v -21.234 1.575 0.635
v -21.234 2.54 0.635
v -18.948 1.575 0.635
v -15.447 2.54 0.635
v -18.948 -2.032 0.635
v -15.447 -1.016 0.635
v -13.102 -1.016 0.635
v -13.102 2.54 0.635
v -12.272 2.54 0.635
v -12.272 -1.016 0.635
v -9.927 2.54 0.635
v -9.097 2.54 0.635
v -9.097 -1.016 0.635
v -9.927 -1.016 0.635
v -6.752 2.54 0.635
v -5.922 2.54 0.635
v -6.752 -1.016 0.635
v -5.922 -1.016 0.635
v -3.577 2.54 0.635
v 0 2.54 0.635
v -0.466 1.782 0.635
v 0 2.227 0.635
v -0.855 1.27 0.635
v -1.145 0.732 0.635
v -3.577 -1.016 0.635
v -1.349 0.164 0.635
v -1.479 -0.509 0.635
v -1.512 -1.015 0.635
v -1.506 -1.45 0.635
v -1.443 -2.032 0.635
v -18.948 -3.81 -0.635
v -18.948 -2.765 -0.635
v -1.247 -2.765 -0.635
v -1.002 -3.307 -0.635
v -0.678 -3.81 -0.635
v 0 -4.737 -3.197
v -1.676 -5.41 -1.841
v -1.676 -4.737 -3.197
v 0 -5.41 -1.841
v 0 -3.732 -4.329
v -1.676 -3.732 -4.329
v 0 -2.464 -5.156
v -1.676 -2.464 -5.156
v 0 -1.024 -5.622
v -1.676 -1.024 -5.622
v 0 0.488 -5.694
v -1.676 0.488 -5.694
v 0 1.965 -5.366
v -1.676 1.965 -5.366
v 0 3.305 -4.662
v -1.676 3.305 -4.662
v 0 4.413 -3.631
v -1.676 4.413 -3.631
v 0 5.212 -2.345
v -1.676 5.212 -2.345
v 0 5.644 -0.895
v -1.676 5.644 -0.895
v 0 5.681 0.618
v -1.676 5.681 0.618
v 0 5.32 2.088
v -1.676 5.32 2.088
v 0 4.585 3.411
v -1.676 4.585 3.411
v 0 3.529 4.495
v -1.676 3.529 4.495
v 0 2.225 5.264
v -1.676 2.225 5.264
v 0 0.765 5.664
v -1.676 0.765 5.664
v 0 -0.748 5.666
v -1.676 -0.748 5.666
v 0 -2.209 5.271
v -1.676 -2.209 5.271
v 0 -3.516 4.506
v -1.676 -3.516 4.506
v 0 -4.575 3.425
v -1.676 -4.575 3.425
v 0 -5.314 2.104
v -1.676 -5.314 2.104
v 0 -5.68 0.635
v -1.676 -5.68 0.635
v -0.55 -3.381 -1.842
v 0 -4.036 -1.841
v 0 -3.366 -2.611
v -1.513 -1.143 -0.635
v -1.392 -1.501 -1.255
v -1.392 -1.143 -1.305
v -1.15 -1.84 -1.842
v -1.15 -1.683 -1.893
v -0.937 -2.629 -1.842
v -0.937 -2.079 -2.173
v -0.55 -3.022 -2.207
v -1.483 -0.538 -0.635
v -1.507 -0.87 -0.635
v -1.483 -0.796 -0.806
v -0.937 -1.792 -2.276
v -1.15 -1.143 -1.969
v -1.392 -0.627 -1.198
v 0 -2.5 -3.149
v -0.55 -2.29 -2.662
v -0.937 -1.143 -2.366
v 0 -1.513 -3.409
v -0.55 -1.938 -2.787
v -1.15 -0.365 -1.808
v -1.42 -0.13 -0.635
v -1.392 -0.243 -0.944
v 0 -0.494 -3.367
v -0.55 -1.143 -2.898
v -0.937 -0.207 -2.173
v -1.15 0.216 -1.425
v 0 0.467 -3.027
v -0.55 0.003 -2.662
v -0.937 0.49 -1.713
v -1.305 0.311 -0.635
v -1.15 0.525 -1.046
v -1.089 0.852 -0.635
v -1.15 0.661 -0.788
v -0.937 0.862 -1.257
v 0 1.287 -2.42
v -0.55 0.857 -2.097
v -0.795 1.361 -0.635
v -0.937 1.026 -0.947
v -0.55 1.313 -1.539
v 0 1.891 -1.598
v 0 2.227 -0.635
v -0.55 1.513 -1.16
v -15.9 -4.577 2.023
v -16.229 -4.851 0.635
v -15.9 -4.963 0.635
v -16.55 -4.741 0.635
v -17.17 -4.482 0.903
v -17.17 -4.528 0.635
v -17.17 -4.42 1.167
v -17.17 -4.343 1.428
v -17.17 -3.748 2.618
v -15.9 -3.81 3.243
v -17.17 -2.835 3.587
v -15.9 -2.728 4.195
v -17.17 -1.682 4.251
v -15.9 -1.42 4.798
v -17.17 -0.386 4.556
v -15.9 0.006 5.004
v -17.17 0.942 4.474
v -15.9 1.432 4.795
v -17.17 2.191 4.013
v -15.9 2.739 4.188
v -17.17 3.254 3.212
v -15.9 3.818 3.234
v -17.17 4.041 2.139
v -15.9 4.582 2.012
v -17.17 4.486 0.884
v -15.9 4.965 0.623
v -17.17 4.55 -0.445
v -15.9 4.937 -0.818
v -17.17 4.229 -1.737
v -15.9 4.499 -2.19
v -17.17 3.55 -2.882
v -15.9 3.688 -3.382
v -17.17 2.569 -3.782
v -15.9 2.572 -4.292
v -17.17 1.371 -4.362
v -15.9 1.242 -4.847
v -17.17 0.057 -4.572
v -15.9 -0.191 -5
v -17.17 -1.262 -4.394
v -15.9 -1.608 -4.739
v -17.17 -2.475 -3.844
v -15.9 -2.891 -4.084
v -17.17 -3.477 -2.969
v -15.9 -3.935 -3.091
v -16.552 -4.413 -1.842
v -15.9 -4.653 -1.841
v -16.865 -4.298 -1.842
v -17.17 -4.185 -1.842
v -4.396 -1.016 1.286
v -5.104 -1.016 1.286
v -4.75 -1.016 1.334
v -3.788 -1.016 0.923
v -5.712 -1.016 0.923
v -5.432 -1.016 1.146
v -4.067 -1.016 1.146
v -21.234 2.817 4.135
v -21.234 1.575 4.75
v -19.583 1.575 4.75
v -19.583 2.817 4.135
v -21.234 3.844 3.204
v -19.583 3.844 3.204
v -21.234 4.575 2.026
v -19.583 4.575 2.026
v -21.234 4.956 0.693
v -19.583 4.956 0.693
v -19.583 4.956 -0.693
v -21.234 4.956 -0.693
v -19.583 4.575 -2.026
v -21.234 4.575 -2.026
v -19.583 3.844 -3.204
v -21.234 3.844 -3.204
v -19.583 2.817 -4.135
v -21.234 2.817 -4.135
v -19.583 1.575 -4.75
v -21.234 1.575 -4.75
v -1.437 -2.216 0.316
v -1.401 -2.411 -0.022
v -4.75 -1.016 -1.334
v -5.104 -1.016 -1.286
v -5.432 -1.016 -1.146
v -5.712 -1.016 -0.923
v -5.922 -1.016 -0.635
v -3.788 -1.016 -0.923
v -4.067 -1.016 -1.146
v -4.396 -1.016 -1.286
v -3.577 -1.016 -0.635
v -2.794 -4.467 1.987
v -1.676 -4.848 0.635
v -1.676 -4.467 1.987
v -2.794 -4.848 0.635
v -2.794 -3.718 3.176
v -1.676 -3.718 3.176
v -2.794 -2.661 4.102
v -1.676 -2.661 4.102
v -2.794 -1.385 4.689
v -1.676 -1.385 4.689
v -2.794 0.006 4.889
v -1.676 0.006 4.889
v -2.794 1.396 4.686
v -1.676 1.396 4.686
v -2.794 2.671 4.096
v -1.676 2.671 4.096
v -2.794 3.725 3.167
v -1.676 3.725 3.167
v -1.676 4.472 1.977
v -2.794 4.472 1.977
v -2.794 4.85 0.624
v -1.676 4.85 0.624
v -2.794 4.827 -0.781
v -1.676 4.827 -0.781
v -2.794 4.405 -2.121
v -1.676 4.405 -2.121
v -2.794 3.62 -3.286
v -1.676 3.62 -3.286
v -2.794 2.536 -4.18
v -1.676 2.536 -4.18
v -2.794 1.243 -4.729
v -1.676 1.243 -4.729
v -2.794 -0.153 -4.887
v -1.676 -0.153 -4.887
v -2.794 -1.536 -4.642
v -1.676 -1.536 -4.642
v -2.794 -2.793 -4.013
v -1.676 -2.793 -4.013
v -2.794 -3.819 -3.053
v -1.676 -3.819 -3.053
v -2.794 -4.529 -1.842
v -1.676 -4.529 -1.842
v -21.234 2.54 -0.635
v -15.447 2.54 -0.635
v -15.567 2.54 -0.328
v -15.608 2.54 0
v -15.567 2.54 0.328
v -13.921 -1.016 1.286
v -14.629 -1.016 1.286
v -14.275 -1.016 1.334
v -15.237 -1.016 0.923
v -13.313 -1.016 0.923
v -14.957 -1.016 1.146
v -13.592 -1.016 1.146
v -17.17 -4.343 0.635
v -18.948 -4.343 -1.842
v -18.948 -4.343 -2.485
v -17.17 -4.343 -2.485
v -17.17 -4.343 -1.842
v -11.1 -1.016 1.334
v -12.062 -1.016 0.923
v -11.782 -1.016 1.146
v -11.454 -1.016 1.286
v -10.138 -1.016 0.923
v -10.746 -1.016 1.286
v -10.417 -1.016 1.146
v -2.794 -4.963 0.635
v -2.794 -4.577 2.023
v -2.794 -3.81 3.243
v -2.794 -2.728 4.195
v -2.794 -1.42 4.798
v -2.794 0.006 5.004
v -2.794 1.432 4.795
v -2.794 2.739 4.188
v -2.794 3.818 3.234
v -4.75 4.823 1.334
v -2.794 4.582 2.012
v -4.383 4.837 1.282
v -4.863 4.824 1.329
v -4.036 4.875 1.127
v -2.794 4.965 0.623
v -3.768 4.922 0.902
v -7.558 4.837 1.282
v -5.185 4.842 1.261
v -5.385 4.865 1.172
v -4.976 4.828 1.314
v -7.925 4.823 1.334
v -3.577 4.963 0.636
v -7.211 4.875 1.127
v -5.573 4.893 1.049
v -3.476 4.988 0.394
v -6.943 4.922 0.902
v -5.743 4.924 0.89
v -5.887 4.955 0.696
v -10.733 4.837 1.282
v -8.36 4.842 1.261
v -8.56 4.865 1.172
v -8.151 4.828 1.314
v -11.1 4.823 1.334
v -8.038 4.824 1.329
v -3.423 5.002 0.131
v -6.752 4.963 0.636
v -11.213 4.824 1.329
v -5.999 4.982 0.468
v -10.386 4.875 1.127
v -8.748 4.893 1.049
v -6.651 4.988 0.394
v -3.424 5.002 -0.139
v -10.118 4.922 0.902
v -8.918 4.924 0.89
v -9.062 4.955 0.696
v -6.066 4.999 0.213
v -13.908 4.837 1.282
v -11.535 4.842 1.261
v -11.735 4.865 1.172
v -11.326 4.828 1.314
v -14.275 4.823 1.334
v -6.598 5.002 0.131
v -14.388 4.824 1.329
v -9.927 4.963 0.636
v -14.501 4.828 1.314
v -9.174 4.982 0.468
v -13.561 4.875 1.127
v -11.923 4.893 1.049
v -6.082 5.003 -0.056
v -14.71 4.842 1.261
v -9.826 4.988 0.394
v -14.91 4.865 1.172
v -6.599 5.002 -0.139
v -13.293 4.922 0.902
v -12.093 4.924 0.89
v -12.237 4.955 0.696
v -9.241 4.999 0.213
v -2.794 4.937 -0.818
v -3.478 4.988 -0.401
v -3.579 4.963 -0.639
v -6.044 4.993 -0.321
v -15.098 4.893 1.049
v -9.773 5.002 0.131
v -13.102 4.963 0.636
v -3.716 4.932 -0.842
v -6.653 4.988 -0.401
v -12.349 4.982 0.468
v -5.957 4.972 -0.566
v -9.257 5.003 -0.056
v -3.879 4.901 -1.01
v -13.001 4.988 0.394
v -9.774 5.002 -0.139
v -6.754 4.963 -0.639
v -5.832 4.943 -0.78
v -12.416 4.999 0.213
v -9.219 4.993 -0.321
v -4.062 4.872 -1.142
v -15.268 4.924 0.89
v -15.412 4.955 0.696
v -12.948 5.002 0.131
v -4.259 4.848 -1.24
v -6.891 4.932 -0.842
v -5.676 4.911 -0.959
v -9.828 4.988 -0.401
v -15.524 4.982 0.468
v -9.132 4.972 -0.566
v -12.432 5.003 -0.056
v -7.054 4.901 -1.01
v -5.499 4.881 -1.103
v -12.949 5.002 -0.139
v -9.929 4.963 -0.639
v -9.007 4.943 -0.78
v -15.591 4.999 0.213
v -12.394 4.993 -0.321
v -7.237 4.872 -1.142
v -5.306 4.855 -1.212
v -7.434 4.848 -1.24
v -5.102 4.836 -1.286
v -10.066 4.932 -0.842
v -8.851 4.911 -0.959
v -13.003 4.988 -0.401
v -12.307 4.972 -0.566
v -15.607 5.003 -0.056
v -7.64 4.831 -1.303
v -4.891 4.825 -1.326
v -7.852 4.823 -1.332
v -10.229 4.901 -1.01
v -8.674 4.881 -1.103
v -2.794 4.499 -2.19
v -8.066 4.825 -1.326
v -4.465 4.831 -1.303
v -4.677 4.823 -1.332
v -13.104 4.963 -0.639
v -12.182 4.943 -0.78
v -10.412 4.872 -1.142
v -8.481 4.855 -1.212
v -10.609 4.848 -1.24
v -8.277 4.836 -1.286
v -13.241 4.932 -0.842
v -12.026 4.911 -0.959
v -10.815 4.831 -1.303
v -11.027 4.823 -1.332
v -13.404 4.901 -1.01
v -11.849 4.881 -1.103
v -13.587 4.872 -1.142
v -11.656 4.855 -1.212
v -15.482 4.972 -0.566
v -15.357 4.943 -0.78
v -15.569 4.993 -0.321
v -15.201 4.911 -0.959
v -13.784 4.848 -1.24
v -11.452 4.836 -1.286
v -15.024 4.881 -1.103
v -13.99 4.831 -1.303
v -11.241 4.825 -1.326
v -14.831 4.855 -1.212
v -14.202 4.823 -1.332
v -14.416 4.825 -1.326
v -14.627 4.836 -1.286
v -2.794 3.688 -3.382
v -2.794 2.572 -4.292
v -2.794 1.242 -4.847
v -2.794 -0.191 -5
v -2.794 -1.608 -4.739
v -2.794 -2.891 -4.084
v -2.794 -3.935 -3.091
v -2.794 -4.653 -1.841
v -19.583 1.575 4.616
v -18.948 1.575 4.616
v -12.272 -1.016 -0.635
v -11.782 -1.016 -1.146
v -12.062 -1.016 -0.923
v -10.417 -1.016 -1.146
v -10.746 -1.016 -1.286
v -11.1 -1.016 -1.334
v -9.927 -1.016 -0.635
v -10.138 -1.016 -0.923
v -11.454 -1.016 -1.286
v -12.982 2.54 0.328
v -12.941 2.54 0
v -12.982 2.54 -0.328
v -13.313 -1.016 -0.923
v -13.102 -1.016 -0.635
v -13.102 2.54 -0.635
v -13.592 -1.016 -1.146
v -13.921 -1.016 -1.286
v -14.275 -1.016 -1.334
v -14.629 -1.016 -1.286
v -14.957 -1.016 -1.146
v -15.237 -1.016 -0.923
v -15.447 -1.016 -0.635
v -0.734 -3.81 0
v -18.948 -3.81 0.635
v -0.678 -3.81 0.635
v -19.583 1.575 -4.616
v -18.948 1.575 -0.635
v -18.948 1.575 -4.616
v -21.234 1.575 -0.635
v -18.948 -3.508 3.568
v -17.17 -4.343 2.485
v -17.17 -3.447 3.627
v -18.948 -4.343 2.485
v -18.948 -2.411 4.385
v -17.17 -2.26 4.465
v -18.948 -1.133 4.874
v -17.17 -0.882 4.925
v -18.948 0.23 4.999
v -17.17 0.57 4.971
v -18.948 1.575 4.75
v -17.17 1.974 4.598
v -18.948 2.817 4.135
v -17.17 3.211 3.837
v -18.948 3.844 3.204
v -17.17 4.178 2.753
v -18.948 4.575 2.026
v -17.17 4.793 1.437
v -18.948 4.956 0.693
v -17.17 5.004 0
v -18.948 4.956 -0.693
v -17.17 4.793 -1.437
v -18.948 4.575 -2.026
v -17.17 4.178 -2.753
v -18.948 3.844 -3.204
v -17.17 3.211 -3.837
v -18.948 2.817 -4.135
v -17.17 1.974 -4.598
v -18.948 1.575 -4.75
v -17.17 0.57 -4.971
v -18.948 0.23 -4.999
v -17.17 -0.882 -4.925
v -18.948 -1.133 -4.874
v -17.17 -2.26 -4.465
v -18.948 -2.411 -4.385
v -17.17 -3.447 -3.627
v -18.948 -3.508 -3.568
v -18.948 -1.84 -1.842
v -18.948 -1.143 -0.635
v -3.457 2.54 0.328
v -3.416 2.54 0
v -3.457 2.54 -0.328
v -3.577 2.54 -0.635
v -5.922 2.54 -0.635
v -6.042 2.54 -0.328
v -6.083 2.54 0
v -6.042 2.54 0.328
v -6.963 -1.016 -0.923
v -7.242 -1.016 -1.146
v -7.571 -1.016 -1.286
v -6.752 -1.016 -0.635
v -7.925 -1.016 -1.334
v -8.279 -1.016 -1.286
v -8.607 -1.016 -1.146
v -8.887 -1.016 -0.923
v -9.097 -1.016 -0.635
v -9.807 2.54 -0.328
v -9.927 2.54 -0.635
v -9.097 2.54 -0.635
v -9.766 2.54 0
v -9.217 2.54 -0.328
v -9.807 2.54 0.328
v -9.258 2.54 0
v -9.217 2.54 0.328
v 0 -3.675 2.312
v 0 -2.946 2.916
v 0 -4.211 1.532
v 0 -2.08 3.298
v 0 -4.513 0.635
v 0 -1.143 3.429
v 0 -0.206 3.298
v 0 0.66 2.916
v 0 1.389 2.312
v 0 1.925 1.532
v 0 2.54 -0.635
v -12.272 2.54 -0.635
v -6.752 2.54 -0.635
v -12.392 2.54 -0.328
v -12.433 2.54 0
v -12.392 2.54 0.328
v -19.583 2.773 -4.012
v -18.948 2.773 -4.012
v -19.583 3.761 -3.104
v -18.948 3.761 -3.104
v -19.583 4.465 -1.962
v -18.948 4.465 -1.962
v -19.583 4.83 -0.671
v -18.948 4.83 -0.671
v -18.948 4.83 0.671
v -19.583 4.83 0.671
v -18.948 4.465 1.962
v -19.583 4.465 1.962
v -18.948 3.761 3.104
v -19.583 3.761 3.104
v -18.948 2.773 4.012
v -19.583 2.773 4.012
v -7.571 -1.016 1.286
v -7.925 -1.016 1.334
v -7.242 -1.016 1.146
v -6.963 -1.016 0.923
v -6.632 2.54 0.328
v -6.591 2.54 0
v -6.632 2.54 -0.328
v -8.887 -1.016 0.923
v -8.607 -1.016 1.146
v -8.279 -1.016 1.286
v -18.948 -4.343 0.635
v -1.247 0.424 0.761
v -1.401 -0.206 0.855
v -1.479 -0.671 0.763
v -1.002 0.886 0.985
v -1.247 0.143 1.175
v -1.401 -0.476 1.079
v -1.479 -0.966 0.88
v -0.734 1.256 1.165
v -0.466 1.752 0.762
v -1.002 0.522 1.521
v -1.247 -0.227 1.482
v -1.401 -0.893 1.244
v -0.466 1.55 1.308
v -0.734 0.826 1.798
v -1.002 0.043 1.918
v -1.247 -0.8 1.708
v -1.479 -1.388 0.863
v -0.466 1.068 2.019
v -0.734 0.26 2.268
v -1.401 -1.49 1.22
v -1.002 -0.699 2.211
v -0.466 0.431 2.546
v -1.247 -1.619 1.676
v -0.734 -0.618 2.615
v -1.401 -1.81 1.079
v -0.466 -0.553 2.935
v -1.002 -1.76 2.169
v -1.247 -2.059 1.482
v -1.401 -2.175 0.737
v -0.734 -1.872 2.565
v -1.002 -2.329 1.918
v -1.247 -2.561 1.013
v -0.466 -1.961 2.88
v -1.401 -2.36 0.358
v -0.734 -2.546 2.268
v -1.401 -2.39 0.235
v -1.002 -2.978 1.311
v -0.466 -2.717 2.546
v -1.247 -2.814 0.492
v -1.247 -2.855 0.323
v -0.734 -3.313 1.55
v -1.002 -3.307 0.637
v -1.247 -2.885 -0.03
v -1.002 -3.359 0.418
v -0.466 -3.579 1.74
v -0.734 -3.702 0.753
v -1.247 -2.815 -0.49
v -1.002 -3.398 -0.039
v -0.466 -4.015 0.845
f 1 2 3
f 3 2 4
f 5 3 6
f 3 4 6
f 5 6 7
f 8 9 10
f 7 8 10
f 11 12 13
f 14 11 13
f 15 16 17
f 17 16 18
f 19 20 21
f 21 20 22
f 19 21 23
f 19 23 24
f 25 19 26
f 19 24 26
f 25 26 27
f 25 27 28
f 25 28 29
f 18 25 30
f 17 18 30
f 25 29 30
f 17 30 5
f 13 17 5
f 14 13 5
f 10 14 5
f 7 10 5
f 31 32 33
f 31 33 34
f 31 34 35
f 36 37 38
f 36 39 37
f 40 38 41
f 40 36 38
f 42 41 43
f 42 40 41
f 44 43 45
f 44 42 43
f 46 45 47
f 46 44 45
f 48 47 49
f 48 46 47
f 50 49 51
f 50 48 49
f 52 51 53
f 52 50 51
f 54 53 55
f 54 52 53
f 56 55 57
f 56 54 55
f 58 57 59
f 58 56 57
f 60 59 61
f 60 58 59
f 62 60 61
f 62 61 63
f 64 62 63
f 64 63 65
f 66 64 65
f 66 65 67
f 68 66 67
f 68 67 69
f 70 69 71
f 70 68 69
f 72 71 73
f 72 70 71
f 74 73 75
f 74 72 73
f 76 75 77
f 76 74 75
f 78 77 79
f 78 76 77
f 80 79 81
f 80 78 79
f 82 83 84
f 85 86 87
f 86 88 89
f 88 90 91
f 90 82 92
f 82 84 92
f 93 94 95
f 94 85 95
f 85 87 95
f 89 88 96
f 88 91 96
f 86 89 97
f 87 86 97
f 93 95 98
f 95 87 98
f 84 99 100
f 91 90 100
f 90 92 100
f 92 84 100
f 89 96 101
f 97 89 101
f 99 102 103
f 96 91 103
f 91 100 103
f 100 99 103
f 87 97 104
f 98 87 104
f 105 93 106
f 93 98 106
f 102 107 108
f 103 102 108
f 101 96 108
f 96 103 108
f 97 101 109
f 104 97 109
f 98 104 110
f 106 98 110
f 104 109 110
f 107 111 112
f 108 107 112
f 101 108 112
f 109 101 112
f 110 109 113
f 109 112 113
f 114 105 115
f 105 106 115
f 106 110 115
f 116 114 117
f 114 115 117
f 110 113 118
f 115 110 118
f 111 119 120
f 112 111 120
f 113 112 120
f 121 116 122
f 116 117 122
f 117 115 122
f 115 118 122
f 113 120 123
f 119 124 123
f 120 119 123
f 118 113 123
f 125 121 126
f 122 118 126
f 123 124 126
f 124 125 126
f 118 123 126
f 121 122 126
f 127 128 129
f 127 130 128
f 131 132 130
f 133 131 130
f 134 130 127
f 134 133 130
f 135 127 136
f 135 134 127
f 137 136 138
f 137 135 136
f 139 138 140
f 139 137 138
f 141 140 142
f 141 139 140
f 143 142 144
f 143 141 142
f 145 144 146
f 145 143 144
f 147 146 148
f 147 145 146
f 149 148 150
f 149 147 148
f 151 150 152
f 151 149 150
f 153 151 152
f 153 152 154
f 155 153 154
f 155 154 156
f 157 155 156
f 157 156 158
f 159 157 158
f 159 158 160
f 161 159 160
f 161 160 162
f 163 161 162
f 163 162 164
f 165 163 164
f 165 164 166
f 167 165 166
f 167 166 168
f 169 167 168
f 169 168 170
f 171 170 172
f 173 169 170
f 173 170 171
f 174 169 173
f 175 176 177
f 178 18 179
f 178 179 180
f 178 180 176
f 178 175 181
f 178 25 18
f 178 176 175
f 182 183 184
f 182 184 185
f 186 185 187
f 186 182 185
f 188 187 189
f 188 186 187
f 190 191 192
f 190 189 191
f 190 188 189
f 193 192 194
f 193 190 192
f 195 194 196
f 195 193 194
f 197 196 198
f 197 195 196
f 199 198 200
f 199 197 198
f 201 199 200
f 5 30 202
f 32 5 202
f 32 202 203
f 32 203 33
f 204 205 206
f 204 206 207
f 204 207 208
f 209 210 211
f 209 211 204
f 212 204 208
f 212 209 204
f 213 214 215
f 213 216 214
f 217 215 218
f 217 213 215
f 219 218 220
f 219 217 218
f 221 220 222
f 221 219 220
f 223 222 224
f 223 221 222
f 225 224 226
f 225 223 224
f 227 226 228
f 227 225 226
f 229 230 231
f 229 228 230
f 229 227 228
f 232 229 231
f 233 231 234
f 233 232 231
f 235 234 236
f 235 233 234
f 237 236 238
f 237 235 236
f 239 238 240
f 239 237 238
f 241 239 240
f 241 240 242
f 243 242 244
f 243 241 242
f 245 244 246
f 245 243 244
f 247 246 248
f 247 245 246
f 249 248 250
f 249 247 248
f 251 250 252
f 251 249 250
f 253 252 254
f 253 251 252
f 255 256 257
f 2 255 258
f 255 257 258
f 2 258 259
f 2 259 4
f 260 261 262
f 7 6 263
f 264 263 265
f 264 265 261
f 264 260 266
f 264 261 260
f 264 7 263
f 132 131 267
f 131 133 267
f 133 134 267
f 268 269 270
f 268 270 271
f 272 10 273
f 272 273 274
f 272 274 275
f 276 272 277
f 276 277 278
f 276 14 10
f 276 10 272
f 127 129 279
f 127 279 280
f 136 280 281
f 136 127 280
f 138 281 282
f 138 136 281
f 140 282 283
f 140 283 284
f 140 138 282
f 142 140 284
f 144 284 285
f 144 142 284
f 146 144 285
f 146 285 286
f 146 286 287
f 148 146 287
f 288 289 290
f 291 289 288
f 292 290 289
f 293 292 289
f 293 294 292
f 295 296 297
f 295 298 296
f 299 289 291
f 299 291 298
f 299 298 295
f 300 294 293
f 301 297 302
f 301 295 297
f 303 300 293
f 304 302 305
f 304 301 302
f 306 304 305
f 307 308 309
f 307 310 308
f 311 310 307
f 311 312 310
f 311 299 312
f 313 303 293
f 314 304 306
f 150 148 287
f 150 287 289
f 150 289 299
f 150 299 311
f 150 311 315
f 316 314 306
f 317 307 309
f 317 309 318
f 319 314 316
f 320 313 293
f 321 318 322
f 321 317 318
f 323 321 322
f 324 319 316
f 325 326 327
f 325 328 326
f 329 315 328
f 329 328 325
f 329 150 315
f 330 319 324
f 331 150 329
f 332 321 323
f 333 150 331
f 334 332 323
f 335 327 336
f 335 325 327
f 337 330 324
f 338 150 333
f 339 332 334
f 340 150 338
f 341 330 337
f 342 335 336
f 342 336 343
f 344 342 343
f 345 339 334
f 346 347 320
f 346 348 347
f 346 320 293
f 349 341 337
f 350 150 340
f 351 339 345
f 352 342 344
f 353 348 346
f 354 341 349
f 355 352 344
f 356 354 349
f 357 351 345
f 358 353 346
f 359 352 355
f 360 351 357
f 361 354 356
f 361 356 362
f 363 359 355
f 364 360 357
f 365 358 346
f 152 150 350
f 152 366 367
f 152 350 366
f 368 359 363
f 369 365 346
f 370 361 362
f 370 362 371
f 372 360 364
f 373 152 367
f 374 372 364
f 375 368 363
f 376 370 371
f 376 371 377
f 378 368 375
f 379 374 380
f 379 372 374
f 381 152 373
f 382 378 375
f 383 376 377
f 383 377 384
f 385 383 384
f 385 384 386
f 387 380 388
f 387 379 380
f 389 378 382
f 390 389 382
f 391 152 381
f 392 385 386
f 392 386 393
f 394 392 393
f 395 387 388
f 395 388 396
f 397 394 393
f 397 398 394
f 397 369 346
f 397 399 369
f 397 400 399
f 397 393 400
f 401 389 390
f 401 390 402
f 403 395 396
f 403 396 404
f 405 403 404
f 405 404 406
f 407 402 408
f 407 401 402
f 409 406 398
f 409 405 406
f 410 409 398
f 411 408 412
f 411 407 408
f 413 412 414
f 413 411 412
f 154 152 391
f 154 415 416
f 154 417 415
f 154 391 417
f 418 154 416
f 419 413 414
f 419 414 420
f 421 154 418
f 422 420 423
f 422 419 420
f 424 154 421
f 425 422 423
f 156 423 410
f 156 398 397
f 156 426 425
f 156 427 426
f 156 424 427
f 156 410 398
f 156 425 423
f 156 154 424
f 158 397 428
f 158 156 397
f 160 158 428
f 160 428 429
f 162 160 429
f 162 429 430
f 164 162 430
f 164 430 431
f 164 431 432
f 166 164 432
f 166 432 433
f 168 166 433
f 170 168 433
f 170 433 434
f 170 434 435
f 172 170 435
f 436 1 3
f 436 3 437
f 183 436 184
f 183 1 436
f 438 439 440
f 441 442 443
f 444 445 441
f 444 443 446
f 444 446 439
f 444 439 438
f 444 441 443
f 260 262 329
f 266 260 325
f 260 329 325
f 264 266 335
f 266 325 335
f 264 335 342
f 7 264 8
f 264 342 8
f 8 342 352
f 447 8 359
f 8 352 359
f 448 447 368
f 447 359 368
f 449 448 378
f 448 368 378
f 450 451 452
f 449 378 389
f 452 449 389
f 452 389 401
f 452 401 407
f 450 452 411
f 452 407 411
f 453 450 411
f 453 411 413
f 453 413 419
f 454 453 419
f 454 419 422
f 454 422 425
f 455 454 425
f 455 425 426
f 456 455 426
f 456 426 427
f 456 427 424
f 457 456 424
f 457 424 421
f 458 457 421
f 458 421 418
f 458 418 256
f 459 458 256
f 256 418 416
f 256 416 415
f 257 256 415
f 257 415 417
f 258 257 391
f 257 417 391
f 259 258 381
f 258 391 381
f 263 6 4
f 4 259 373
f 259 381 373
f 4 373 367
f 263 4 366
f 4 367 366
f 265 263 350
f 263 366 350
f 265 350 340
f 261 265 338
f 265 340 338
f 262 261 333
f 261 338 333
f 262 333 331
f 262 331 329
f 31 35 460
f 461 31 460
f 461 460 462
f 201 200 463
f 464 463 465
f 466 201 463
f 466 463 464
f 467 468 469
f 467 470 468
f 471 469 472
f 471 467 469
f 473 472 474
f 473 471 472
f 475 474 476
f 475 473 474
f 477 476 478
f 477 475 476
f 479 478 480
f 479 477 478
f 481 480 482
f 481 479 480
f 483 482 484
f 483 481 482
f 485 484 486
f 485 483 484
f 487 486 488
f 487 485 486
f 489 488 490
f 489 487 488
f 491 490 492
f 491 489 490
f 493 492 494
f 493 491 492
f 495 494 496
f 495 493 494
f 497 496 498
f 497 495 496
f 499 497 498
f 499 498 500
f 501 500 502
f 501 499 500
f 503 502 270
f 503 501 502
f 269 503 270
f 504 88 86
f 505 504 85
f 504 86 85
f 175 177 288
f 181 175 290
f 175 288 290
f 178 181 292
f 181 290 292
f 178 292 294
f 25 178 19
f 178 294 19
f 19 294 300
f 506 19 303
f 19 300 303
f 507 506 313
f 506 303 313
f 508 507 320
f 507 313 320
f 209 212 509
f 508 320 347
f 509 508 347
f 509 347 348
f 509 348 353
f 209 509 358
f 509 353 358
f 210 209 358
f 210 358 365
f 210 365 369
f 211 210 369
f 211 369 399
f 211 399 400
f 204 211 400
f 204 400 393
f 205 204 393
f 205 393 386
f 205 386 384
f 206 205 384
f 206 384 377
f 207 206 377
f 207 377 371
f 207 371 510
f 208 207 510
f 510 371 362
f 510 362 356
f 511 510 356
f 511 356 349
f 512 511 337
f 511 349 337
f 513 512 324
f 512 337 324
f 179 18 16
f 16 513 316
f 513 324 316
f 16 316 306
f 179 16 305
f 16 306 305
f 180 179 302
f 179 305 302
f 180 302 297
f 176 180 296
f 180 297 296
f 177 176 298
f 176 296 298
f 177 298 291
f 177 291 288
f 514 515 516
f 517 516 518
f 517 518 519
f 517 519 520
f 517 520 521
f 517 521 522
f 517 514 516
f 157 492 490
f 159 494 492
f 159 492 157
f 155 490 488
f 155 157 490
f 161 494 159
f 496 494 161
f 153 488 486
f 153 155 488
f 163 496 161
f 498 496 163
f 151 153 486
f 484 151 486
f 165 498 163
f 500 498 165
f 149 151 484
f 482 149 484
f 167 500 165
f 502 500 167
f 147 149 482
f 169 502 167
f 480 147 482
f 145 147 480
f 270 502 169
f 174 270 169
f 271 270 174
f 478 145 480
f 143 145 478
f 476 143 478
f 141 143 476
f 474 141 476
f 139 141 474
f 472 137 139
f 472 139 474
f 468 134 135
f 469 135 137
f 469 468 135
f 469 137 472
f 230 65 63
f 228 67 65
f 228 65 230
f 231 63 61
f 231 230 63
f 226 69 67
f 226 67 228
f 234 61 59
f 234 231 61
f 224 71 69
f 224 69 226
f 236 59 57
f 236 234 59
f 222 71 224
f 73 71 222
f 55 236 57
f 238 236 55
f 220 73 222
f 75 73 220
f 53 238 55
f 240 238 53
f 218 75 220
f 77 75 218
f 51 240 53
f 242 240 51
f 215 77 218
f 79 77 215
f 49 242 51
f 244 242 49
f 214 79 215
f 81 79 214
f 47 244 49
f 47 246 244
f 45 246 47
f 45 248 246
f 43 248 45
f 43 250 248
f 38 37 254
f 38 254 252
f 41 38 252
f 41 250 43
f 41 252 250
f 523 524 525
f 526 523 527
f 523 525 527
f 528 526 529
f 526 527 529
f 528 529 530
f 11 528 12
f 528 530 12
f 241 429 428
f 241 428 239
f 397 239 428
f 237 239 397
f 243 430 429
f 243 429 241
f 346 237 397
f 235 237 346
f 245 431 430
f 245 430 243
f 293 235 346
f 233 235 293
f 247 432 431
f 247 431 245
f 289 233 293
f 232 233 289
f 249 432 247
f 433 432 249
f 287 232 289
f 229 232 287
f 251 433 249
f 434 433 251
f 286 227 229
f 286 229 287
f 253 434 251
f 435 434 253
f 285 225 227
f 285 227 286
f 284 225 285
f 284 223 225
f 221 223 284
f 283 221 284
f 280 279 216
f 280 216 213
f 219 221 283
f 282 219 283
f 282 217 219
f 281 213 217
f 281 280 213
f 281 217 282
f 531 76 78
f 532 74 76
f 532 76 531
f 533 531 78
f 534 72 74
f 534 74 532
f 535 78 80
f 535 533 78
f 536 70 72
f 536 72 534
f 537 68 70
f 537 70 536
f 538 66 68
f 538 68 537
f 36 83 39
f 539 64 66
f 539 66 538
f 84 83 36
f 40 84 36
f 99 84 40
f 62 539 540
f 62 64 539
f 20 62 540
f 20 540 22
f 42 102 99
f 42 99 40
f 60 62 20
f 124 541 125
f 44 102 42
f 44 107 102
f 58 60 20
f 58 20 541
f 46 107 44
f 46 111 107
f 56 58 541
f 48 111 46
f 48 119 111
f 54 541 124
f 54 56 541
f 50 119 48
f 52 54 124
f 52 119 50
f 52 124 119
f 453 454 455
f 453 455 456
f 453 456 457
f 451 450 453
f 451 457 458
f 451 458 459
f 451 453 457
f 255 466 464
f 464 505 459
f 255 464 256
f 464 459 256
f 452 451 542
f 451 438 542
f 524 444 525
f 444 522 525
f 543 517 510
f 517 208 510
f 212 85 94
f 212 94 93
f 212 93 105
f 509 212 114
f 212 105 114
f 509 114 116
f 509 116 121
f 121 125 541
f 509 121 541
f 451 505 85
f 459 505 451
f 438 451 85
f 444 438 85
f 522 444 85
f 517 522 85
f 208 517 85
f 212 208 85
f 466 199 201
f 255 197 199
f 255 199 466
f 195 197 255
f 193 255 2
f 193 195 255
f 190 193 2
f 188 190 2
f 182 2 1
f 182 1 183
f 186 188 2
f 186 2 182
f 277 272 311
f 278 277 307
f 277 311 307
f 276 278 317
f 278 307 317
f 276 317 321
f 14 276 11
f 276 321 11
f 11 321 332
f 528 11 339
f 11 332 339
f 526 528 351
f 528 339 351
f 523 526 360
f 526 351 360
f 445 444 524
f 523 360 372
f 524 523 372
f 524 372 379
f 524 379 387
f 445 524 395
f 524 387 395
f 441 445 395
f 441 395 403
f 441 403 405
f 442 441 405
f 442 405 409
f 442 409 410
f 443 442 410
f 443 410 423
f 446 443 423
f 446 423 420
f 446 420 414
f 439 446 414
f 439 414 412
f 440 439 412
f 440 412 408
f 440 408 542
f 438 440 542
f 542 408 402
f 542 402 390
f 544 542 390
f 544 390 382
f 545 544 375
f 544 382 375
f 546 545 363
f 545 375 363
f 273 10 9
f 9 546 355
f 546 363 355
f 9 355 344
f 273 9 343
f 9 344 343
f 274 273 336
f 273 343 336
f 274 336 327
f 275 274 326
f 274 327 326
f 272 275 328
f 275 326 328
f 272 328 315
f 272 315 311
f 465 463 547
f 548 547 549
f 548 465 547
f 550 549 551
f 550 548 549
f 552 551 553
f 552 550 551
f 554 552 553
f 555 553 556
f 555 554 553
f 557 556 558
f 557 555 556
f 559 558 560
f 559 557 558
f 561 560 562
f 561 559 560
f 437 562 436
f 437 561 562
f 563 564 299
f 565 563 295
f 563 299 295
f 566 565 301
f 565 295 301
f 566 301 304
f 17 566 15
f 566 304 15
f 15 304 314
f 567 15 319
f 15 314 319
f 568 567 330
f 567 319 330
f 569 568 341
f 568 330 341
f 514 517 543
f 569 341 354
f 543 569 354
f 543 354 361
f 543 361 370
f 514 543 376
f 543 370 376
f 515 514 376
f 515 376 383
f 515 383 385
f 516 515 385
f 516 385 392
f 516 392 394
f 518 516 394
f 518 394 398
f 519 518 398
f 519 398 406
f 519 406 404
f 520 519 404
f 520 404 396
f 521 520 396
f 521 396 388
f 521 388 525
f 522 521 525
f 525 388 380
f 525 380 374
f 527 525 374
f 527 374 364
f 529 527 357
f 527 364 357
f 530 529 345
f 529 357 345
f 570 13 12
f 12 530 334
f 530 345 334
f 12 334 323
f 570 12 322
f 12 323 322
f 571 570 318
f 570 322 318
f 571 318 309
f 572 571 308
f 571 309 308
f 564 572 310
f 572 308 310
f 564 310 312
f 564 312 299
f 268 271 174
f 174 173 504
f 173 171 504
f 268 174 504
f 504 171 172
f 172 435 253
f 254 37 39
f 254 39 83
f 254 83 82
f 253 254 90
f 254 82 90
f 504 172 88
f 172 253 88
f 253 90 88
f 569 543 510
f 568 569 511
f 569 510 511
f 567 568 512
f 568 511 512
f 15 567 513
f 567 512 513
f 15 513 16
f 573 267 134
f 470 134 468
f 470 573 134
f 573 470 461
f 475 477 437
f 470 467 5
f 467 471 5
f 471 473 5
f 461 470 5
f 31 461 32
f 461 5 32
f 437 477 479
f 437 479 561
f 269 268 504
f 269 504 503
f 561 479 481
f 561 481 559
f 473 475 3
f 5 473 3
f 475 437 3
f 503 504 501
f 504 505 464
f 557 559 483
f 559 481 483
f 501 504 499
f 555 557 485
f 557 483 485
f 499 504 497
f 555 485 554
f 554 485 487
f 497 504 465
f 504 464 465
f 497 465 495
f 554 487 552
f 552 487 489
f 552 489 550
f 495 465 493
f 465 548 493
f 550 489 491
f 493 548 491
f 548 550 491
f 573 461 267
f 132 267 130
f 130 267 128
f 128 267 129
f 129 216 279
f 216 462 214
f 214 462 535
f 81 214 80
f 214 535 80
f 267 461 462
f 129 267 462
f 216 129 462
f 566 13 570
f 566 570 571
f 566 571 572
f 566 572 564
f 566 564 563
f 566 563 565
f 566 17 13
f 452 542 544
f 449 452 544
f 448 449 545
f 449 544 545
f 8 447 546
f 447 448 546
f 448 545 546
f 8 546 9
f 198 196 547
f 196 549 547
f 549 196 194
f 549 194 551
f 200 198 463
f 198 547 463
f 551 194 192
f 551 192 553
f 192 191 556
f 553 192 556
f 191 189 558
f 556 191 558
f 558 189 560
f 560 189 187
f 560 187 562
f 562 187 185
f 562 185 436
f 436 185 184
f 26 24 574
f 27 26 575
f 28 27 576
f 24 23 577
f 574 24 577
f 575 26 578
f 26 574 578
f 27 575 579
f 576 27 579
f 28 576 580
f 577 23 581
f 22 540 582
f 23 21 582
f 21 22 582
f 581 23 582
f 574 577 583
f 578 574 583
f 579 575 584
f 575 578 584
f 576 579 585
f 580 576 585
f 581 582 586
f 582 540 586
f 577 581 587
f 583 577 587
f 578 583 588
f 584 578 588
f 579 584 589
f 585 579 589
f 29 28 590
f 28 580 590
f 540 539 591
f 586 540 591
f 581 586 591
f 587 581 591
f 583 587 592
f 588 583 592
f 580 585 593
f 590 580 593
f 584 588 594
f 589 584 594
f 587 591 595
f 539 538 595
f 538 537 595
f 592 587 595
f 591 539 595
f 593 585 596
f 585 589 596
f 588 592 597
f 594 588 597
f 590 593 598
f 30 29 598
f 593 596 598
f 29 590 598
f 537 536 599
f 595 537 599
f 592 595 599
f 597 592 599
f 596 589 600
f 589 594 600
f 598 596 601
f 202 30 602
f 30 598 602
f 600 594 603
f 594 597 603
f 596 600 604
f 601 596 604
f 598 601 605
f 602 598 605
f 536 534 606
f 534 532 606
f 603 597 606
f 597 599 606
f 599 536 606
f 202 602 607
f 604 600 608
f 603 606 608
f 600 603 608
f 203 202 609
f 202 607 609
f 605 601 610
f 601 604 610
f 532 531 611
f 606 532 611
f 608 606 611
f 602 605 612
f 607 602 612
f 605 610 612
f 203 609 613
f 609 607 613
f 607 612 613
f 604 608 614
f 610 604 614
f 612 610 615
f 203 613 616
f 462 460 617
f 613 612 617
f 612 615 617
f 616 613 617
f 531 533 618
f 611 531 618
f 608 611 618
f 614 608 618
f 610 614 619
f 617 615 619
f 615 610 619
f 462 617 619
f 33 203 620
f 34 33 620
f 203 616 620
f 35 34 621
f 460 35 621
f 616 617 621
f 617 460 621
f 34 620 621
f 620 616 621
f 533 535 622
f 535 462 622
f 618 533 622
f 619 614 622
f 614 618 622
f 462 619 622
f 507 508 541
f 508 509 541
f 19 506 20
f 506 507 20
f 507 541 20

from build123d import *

# Parameters (mm, degrees)
SKETCH2_R           = 5.715
BOSS_EXTRUDE1_DEPTH = 18.9484
BOSS_EXTRUDE2_START = 2.286
BOSS_EXTRUDE2_DEPTH = 2.286
SKETCH6_W           = 0.635
SKETCH6_H           = 0.127
CUT_EXTRUDE2_DEPTH  = 1.778
CUT_EXTRUDE3_DEPTH  = 23.720523615
SKETCH12_R          = 1.3335
CUT_EXTRUDE4_DEPTH  = 6.096


with BuildPart() as part:
    # Sketch2 → Boss-Extrude1 (new body)
    with BuildSketch(Plane(origin=(0, 0, 0), x_dir=(0, 0, -1), z_dir=(1, 0, 0))):
        Circle(SKETCH2_R)
    extrude(amount=-BOSS_EXTRUDE1_DEPTH)

    # Sketch3 → Cut-Revolve1 (revolve, cut)
    with BuildSketch(Plane.XY, mode=Mode.PRIVATE) as cut_revolve1_sk:
        Polygon((-18.9484, 5.715), (-1.6764, 5.715), (-1.6764, 4.8895), (-2.794, 4.8895), (-2.794, 5.0038), (-15.9004, 5.0038), (-17.1704, 4.572), (-17.1704, 5.0038), (-18.9484, 5.0038), align=None)
    revolve(cut_revolve1_sk.sketch.rotate(Axis((0, 0, 0), (-1, 0, 0)), 90), axis=Axis((0, 0, 0), (-1, 0, 0)), mode=Mode.SUBTRACT)

    # Sketch5 → Boss-Extrude2 (add)
    with BuildSketch(Plane.ZY.offset(18.9484).offset(BOSS_EXTRUDE2_START)):
        with BuildLine():
            Line((-4.749528334, 1.5748), (4.749528334, 1.5748))
            ThreePointArc((4.749528334, 1.5748), (0, 5.0038), (-4.749528334, 1.5748))
        make_face()
    extrude(amount=-BOSS_EXTRUDE2_DEPTH)

    # Sketch6 → Cut-Revolve2 (revolve, cut)
    with BuildSketch(Plane.XY):
        with Locations((-19.2659, 4.9403)):
            Rectangle(SKETCH6_W, SKETCH6_H)
    revolve(axis=Axis((0, 0, 0), (1, 0, 0)), mode=Mode.SUBTRACT)

    # Sketch7 → Cut-Extrude2 (cut)
    with BuildSketch(Plane.ZY.offset(18.9484)):
        with BuildLine():
            Line((-2.484530314, -4.3434), (2.484530314, -4.3434))
            ThreePointArc((2.484530314, -4.3434), (0, -5.0038), (-2.484530314, -4.3434))
        make_face()
    extrude(amount=-CUT_EXTRUDE2_DEPTH, mode=Mode.SUBTRACT)

    # Sketch8 → Cut-Extrude3 (cut, through all)
    with BuildSketch(Plane(origin=(0, 0, 0), x_dir=(0, 0, -1), z_dir=(1, 0, 0))):
        Polygon((-0.635, -5.715), (1.8415, -5.715), (1.8415, -1.8395731), (0.635, -1.143), (0.635, 2.54), (-0.635, 2.54), (-0.635, -2.032), (0.635, -2.765234842), (0.635, -3.81), (-0.635, -3.81), align=None)
    extrude(amount=-CUT_EXTRUDE3_DEPTH, mode=Mode.SUBTRACT)

    # Sketch12 → Cut-Extrude4 (cut)
    with BuildSketch(Plane(origin=(0, 5.08, 0), x_dir=(1, 0, 0), z_dir=(0, 1, 0))):
        with Locations(Location((-4.7498, 0, 0), (0, 0, 270))):
            Circle(SKETCH12_R)
        with Locations(Location((-7.9248, 0, 0), (0, 0, 270))):
            Circle(SKETCH12_R)
        with Locations(Location((-11.0998, 0, 0), (0, 0, 270))):
            Circle(SKETCH12_R)
        with Locations(Location((-14.2748, 0, 0), (0, 0, 270))):
            Circle(SKETCH12_R)
    extrude(amount=-CUT_EXTRUDE4_DEPTH, mode=Mode.SUBTRACT)

    # Sketch13 → Cut-Revolve3 (revolve, cut)
    with BuildSketch(Plane.XY):
        with BuildLine():
            Line((0, 2.286), (0, -1.143))
            Line((0, -1.143), (-1.524, -1.143))
            ThreePointArc((-1.524, -1.143), (-1.180835312, 0.757649028), (0, 2.286))
        make_face()
    revolve(axis=Axis((-1.524, -1.143, 0), (1, 0, 0)), mode=Mode.SUBTRACT)


solid = part.part
